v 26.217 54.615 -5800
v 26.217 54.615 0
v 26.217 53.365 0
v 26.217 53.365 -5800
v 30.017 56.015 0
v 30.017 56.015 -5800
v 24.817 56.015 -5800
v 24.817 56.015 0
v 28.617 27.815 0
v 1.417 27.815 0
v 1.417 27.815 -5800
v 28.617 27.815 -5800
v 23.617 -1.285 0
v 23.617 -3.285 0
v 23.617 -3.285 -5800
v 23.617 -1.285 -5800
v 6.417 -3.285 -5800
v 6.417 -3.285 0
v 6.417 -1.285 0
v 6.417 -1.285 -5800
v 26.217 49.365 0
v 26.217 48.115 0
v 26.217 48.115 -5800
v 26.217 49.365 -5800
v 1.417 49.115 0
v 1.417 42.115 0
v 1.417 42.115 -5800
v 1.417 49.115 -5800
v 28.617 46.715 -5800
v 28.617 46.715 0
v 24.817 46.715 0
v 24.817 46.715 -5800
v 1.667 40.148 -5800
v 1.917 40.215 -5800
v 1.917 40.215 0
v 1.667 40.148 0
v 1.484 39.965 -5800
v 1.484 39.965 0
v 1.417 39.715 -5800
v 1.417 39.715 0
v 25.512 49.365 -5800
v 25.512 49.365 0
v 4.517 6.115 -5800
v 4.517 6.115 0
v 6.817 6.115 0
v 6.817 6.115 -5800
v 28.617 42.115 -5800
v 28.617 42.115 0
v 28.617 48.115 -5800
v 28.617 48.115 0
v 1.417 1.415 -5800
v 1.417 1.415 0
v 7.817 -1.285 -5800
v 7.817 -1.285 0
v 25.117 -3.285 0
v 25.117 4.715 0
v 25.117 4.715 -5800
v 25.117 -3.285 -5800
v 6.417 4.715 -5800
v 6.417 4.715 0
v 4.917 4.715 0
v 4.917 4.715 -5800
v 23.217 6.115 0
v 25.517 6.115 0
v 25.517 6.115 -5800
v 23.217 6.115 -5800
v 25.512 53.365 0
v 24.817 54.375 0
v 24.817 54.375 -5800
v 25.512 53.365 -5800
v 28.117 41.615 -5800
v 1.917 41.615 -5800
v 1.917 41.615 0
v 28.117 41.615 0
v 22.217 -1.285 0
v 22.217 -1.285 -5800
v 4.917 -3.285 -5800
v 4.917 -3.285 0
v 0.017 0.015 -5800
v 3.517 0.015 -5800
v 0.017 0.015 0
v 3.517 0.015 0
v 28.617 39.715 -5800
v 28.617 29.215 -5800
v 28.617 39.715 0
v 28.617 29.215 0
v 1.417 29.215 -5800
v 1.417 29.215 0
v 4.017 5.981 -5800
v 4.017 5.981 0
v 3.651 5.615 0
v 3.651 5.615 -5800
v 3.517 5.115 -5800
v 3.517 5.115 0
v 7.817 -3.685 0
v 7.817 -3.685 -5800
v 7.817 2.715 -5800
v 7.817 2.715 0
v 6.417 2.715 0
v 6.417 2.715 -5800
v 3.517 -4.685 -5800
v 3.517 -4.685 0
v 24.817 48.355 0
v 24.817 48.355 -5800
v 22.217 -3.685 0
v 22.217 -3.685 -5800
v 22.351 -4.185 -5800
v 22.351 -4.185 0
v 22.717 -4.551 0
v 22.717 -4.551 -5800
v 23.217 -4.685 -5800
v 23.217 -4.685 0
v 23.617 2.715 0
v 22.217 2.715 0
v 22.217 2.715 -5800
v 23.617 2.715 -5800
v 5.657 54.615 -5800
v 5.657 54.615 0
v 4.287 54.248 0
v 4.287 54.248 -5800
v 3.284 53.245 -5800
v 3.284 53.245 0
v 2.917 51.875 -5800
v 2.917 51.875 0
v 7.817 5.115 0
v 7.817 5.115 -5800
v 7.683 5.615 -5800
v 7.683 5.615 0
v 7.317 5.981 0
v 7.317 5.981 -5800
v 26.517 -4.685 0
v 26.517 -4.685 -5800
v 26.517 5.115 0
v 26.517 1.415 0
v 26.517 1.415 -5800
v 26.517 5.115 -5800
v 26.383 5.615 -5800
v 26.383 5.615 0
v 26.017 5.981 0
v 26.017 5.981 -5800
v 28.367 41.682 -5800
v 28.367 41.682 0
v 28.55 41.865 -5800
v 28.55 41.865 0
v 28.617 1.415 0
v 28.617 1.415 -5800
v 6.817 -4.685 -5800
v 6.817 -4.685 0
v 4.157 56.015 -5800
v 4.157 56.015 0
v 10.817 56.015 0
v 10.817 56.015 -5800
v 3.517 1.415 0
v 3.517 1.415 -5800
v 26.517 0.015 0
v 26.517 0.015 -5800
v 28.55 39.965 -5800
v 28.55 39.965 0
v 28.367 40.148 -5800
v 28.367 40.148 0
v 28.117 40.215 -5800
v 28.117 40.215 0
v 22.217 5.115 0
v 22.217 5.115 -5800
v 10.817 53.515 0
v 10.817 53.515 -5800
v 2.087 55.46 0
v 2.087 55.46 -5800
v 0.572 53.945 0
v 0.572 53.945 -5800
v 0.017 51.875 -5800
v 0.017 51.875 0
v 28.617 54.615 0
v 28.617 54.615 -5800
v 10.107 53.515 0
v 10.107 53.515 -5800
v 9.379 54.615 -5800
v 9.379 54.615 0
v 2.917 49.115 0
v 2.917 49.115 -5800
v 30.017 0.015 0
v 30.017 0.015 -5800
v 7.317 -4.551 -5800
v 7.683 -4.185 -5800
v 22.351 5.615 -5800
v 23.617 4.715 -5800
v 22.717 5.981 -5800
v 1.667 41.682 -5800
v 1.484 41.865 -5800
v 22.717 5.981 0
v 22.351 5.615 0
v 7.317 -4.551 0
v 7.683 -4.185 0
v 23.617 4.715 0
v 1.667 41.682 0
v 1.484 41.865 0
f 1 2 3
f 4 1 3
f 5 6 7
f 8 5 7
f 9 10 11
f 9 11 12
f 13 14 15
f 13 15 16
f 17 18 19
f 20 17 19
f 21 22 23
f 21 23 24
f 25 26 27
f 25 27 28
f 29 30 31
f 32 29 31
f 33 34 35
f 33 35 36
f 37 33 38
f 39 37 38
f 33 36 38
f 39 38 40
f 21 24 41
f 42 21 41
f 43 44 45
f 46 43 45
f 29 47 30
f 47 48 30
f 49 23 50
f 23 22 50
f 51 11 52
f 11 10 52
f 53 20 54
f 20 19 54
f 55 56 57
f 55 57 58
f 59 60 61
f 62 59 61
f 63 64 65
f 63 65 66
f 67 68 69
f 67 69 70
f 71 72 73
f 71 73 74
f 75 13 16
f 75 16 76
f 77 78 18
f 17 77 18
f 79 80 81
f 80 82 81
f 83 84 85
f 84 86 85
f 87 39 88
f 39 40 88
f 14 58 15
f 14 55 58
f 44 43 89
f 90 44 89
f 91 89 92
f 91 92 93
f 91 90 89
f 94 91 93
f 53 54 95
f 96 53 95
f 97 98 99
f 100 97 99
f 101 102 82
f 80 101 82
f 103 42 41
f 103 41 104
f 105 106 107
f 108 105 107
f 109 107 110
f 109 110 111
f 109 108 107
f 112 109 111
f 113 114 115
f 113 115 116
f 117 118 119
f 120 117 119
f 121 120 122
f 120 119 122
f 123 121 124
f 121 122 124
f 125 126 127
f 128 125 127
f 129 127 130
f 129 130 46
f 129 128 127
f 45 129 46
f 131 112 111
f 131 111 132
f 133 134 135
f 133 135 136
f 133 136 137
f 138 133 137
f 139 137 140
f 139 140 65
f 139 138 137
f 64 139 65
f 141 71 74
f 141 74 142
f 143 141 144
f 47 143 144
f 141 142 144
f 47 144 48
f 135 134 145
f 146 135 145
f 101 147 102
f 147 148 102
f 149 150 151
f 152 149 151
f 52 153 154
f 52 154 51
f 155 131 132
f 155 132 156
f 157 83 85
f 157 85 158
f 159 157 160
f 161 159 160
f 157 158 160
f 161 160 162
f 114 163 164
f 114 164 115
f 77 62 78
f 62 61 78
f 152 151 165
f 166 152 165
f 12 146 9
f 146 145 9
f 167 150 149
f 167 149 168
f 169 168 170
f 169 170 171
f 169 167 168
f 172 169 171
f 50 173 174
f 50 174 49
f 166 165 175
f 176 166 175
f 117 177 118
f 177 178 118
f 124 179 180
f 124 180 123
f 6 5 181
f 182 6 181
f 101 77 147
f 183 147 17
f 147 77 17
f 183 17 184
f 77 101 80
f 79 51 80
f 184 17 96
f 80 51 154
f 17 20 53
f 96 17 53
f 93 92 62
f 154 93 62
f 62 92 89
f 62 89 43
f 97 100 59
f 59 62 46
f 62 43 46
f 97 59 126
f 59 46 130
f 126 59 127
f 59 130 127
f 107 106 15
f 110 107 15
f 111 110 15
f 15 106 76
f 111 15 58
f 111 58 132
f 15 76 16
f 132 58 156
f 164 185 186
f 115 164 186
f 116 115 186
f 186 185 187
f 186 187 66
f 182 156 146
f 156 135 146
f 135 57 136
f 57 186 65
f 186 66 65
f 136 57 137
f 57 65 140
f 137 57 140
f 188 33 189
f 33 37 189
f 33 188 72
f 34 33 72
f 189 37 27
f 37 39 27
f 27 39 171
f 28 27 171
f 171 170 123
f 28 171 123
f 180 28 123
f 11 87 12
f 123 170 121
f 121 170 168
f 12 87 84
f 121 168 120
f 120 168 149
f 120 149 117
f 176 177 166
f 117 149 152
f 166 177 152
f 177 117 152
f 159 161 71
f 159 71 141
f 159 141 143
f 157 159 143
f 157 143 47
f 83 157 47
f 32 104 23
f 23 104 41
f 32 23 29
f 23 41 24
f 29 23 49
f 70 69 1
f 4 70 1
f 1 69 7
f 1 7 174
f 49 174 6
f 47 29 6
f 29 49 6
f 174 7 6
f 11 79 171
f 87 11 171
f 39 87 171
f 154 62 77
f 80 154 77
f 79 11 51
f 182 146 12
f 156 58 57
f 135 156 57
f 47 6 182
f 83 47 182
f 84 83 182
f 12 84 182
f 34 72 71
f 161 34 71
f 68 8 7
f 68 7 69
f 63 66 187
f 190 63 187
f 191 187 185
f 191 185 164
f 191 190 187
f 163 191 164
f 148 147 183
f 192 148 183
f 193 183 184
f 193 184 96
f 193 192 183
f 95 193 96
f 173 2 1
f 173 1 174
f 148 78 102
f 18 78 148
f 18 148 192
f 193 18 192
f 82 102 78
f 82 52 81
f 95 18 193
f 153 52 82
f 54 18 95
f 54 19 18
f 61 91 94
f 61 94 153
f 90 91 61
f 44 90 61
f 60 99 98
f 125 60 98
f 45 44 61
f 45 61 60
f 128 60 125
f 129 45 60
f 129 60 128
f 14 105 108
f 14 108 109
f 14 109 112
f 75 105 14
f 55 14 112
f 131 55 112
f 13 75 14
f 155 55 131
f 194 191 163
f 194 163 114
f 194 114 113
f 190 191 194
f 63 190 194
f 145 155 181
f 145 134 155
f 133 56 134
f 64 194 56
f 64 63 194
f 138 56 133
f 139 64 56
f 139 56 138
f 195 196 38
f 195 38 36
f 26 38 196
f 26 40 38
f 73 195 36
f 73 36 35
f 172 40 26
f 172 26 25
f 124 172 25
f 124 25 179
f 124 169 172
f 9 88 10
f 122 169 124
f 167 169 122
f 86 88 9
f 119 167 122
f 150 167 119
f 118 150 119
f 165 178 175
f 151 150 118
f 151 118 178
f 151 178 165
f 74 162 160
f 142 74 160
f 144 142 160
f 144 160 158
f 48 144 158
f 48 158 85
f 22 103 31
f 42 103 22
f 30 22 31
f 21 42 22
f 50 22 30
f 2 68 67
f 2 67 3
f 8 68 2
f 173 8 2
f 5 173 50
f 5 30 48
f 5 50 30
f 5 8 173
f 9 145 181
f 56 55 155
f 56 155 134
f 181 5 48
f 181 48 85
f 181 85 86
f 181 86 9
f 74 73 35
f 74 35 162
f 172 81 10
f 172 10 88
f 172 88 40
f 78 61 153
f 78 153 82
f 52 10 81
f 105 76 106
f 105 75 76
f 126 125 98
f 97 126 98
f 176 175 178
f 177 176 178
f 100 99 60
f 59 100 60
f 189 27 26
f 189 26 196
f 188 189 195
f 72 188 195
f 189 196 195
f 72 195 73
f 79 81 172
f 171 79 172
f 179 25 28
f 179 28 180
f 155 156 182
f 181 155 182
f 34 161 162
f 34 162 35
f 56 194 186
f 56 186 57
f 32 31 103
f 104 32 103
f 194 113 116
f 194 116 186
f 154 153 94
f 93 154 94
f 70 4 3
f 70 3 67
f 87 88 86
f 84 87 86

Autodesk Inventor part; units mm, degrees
ref_plane "YZ Plane" through (0, 0, 0) normal (1, 0, 0) x (0, 1, 0)
ref_plane "XZ Plane" through (0, 0, 0) normal (0, 1, 0) x (-1, 0, 0)
ref_plane "XY Plane" through (0, 0, 0) normal (0, 0, 1) x (1, 0, 0)
sketch "Boceto1" plane through (0, 0, 0) normal (0, 0, 1) x (1, 0, 0)
  line L0 (28.1174, 40.2149) -> (1.9174, 40.2149)
  line L1 (1.9174, 41.6149) -> (28.1174, 41.6149)
  line L2 (0.0174, 0.0149) -> (0.0174, 51.8749)
  line L3 (24.8174, 56.0149) -> (24.8174, 54.3749)
  line L4 (28.6174, 54.6149) -> (28.6174, 48.1149)
  line L5 (28.6174, 46.7149) -> (24.8174, 46.7149)
  line L6 (24.8174, 46.7149) -> (24.8174, 48.3549)
  line L7 (26.2174, 48.1149) -> (28.6174, 48.1149)
  line L8 (26.2174, 49.3649) -> (25.5116, 49.3649)
  line L9 (25.5116, 49.3649) -> (24.8174, 48.3549)
  line L10 (26.2174, 53.3649) -> (25.5116, 53.3649)
  line L11 (1.4174, 42.1149) -> (1.4174, 49.1149)
  line L12 (1.4174, 49.1149) -> (2.9174, 49.1149)
  line L13 (2.9174, 49.1149) -> (2.9174, 51.8749)
  line L14 (4.1574, 56.0149) -> (10.8174, 56.0149)
  line L15 (9.3794, 54.6149) -> (5.6574, 54.6149)
  line L16 (10.8174, 56.0149) -> (10.8174, 53.5149)
  line L17 (10.8174, 53.5149) -> (10.1074, 53.5149)
  line L18 (10.1074, 53.5149) -> (9.3794, 54.6149)
  line L19 (26.2174, 54.6149) -> (28.6174, 54.6149)
  arc A0 (5.6574, 54.6149) -> (2.9174, 51.8749) centre (5.6574, 51.8749) ccw
  arc A1 (4.1574, 56.0149) -> (0.0174, 51.8749) centre (4.1574, 51.8749) ccw
  line L20 (24.8174, 54.3749) -> (25.5116, 53.3649)
  line L21 (26.2174, 54.6149) -> (26.2174, 53.3649)
  line L22 (26.2174, 48.1149) -> (26.2174, 49.3649)
  arc A2 (1.9174, 40.2149) -> (1.4174, 39.7149) centre (1.9174, 39.7149) ccw
  arc A3 (28.6174, 39.7149) -> (28.1174, 40.2149) centre (28.1174, 39.7149) ccw
  arc A4 (28.1174, 41.6149) -> (28.6174, 42.1149) centre (28.1174, 42.1149) ccw
  arc A5 (1.4174, 42.1149) -> (1.9174, 41.6149) centre (1.9174, 42.1149) ccw
  line L23 (30.0174, 56.0149) -> (24.8174, 56.0149)
  line L24 (28.6174, 42.1149) -> (28.6174, 46.7149)
  line L25 (30.0174, 56.0149) -> (30.0174, 0.0149)
  line L26 (1.4174, 29.2149) -> (28.6174, 29.2149)
  line L27 (1.4174, 27.8149) -> (28.6174, 27.8149)
  line L28 (1.4174, 39.7149) -> (1.4174, 29.2149)
  line L29 (1.4174, 27.8149) -> (1.4174, 1.4149)
  line L30 (28.6174, 1.4149) -> (28.6174, 27.8149)
  line L31 (28.6174, 29.2149) -> (28.6174, 39.7149)
  line L32 (28.6174, 39.7149) -> (28.6174, 29.2149)
  line L33 (28.6174, 27.8149) -> (28.6174, 1.4149)
  line L34 (4.5174, 6.1149) -> (6.8174, 6.1149)
  line L35 (7.8174, 5.1149) -> (7.8174, 2.7149)
  line L36 (7.8174, 2.7149) -> (6.4174, 2.7149)
  line L37 (6.4174, 2.7149) -> (6.4174, 4.7149)
  line L38 (6.4174, 4.7149) -> (4.9174, 4.7149)
  line L39 (4.9174, 4.7149) -> (4.9174, -3.2851)
  line L40 (4.9174, -3.2851) -> (6.4174, -3.2851)
  line L41 (6.4174, -3.2851) -> (6.4174, -1.2851)
  line L42 (6.4174, -1.2851) -> (7.8174, -1.2851)
  line L43 (7.8174, -1.2851) -> (7.8174, -3.6851)
  line L44 (6.8174, -4.6851) -> (3.5174, -4.6851)
  line L45 (3.5174, -4.6851) -> (3.5174, 0.0149)
  arc A6 (7.8174, 5.1149) -> (6.8174, 6.1149) centre (6.8174, 5.1149) ccw
  arc A7 (4.5174, 6.1149) -> (3.5174, 5.1149) centre (4.5174, 5.1149) ccw
  arc A8 (6.8174, -4.6851) -> (7.8174, -3.6851) centre (6.8174, -3.6851) ccw
  line L46 (3.5174, 1.4149) -> (1.4174, 1.4149)
  line L47 (3.5174, 0.0149) -> (0.0174, 0.0149)
  line L48 (3.5174, 1.4149) -> (3.5174, 5.1149)
  line L49 (25.5174, 6.1149) -> (23.2174, 6.1149)
  line L50 (22.2174, 5.1149) -> (22.2174, 2.7149)
  line L51 (22.2174, 2.7149) -> (23.6174, 2.7149)
  line L52 (23.6174, 2.7149) -> (23.6174, 4.7149)
  line L53 (23.6174, 4.7149) -> (25.1174, 4.7149)
  line L54 (25.1174, 4.7149) -> (25.1174, -3.2851)
  line L55 (25.1174, -3.2851) -> (23.6174, -3.2851)
  line L56 (23.6174, -3.2851) -> (23.6174, -1.2851)
  line L57 (23.6174, -1.2851) -> (22.2174, -1.2851)
  line L58 (22.2174, -1.2851) -> (22.2174, -3.6851)
  line L59 (23.2174, -4.6851) -> (26.5174, -4.6851)
  line L60 (26.5174, -4.6851) -> (26.5174, 0.0149)
  arc A9 (23.2174, 6.1149) -> (22.2174, 5.1149) centre (23.2174, 5.1149) ccw
  arc A10 (26.5174, 5.1149) -> (25.5174, 6.1149) centre (25.5174, 5.1149) ccw
  arc A11 (22.2174, -3.6851) -> (23.2174, -4.6851) centre (23.2174, -3.6851) ccw
  line L61 (26.5174, 1.4149) -> (28.6174, 1.4149)
  line L62 (26.5174, 0.0149) -> (30.0174, 0.0149)
  line L63 (26.5174, 1.4149) -> (26.5174, 5.1149)
  point P0 (28.6174, 51.3649)
  point P1 (0.0174, 0.9149)
  point P2 (4.9174, 0.7149)
  point P3 (25.1174, 0.7149)
  dimension "d31" = 1.4
  dimension "d42" = 2.5
  dimension "d43" = 0.71
  dimension "d45" = 2.9
  dimension "d47" = 33.5
  dimension "d48" = 7.5
  dimension "d51" = 2.74
  dimension "d59" = 6.9
  dimension "d60" = 1.4
  dimension "d78" = 6.5
  dimension "d84" = 1.4
  dimension "d85" = 1.4
  dimension "d88" = 2.4
  dimension "d95" = 6.02
  dimension "d99" = 111
  dimension "d100" = 2.4
  dimension "d109" = 0.7058
  dimension "d110" = 0.7058
  dimension "d143" = 1.4
  dimension "d147" = 1.4
  dimension "d148" = 30
  dimension "d149" = 1.4
  dimension "d150" = 14
  dimension "d151" = 27.2
  dimension "d152" = 14.4
  dimension "d153" = 1.4
  dimension "d154" = 11
  dimension "d155" = 1.4
  dimension "d156" = 1.4
  dimension "d157" = 1.4
  dimension "d158" = 1.4
  dimension "d162" = 60.7
  dimension "d163" = 10.8
  dimension "d164" = 8
  dimension "d165" = 2
  dimension "d166" = 4
  dimension "d167" = 1.5
  dimension "d168" = 7.8
  dimension "d169" = 1
  dimension "d172" = 1.4
  dimension "d173" = 4.7
  dimension "d175" = 56
  dimension "d176" = 13.8
  dimension "d177" = 14.4
  dimension "d180" = 1.5
  dimension "d181" = 4.14
  dimension "d182" = 10.8
  dimension "d183" = 14.4
  dimension "d184" = 0.5
  dimension "d187" = 3.5
  dimension "d188" = 4.9
  dimension "d189" = 6.4
  dimension "d190" = 7.8
  dimension "d191" = 26.5
  dimension "d193" = 54.6
  dimension "d195" = 3.5
  dimension "d196" = 4.9
  dimension "d197" = 53.9
  dimension "d198" = 53.7
  dimension "d199" = 2
  dimension "d200" = 2
  dimension "d201" = 4
  dimension "d202" = 3.01
  dimension "d203" = 9.3
extrude "Extrusión1" add sketch "Boceto1" against normal blind 5800
properties part number "SP40-10 HOJA CORREDERA" material "Aluminio"
